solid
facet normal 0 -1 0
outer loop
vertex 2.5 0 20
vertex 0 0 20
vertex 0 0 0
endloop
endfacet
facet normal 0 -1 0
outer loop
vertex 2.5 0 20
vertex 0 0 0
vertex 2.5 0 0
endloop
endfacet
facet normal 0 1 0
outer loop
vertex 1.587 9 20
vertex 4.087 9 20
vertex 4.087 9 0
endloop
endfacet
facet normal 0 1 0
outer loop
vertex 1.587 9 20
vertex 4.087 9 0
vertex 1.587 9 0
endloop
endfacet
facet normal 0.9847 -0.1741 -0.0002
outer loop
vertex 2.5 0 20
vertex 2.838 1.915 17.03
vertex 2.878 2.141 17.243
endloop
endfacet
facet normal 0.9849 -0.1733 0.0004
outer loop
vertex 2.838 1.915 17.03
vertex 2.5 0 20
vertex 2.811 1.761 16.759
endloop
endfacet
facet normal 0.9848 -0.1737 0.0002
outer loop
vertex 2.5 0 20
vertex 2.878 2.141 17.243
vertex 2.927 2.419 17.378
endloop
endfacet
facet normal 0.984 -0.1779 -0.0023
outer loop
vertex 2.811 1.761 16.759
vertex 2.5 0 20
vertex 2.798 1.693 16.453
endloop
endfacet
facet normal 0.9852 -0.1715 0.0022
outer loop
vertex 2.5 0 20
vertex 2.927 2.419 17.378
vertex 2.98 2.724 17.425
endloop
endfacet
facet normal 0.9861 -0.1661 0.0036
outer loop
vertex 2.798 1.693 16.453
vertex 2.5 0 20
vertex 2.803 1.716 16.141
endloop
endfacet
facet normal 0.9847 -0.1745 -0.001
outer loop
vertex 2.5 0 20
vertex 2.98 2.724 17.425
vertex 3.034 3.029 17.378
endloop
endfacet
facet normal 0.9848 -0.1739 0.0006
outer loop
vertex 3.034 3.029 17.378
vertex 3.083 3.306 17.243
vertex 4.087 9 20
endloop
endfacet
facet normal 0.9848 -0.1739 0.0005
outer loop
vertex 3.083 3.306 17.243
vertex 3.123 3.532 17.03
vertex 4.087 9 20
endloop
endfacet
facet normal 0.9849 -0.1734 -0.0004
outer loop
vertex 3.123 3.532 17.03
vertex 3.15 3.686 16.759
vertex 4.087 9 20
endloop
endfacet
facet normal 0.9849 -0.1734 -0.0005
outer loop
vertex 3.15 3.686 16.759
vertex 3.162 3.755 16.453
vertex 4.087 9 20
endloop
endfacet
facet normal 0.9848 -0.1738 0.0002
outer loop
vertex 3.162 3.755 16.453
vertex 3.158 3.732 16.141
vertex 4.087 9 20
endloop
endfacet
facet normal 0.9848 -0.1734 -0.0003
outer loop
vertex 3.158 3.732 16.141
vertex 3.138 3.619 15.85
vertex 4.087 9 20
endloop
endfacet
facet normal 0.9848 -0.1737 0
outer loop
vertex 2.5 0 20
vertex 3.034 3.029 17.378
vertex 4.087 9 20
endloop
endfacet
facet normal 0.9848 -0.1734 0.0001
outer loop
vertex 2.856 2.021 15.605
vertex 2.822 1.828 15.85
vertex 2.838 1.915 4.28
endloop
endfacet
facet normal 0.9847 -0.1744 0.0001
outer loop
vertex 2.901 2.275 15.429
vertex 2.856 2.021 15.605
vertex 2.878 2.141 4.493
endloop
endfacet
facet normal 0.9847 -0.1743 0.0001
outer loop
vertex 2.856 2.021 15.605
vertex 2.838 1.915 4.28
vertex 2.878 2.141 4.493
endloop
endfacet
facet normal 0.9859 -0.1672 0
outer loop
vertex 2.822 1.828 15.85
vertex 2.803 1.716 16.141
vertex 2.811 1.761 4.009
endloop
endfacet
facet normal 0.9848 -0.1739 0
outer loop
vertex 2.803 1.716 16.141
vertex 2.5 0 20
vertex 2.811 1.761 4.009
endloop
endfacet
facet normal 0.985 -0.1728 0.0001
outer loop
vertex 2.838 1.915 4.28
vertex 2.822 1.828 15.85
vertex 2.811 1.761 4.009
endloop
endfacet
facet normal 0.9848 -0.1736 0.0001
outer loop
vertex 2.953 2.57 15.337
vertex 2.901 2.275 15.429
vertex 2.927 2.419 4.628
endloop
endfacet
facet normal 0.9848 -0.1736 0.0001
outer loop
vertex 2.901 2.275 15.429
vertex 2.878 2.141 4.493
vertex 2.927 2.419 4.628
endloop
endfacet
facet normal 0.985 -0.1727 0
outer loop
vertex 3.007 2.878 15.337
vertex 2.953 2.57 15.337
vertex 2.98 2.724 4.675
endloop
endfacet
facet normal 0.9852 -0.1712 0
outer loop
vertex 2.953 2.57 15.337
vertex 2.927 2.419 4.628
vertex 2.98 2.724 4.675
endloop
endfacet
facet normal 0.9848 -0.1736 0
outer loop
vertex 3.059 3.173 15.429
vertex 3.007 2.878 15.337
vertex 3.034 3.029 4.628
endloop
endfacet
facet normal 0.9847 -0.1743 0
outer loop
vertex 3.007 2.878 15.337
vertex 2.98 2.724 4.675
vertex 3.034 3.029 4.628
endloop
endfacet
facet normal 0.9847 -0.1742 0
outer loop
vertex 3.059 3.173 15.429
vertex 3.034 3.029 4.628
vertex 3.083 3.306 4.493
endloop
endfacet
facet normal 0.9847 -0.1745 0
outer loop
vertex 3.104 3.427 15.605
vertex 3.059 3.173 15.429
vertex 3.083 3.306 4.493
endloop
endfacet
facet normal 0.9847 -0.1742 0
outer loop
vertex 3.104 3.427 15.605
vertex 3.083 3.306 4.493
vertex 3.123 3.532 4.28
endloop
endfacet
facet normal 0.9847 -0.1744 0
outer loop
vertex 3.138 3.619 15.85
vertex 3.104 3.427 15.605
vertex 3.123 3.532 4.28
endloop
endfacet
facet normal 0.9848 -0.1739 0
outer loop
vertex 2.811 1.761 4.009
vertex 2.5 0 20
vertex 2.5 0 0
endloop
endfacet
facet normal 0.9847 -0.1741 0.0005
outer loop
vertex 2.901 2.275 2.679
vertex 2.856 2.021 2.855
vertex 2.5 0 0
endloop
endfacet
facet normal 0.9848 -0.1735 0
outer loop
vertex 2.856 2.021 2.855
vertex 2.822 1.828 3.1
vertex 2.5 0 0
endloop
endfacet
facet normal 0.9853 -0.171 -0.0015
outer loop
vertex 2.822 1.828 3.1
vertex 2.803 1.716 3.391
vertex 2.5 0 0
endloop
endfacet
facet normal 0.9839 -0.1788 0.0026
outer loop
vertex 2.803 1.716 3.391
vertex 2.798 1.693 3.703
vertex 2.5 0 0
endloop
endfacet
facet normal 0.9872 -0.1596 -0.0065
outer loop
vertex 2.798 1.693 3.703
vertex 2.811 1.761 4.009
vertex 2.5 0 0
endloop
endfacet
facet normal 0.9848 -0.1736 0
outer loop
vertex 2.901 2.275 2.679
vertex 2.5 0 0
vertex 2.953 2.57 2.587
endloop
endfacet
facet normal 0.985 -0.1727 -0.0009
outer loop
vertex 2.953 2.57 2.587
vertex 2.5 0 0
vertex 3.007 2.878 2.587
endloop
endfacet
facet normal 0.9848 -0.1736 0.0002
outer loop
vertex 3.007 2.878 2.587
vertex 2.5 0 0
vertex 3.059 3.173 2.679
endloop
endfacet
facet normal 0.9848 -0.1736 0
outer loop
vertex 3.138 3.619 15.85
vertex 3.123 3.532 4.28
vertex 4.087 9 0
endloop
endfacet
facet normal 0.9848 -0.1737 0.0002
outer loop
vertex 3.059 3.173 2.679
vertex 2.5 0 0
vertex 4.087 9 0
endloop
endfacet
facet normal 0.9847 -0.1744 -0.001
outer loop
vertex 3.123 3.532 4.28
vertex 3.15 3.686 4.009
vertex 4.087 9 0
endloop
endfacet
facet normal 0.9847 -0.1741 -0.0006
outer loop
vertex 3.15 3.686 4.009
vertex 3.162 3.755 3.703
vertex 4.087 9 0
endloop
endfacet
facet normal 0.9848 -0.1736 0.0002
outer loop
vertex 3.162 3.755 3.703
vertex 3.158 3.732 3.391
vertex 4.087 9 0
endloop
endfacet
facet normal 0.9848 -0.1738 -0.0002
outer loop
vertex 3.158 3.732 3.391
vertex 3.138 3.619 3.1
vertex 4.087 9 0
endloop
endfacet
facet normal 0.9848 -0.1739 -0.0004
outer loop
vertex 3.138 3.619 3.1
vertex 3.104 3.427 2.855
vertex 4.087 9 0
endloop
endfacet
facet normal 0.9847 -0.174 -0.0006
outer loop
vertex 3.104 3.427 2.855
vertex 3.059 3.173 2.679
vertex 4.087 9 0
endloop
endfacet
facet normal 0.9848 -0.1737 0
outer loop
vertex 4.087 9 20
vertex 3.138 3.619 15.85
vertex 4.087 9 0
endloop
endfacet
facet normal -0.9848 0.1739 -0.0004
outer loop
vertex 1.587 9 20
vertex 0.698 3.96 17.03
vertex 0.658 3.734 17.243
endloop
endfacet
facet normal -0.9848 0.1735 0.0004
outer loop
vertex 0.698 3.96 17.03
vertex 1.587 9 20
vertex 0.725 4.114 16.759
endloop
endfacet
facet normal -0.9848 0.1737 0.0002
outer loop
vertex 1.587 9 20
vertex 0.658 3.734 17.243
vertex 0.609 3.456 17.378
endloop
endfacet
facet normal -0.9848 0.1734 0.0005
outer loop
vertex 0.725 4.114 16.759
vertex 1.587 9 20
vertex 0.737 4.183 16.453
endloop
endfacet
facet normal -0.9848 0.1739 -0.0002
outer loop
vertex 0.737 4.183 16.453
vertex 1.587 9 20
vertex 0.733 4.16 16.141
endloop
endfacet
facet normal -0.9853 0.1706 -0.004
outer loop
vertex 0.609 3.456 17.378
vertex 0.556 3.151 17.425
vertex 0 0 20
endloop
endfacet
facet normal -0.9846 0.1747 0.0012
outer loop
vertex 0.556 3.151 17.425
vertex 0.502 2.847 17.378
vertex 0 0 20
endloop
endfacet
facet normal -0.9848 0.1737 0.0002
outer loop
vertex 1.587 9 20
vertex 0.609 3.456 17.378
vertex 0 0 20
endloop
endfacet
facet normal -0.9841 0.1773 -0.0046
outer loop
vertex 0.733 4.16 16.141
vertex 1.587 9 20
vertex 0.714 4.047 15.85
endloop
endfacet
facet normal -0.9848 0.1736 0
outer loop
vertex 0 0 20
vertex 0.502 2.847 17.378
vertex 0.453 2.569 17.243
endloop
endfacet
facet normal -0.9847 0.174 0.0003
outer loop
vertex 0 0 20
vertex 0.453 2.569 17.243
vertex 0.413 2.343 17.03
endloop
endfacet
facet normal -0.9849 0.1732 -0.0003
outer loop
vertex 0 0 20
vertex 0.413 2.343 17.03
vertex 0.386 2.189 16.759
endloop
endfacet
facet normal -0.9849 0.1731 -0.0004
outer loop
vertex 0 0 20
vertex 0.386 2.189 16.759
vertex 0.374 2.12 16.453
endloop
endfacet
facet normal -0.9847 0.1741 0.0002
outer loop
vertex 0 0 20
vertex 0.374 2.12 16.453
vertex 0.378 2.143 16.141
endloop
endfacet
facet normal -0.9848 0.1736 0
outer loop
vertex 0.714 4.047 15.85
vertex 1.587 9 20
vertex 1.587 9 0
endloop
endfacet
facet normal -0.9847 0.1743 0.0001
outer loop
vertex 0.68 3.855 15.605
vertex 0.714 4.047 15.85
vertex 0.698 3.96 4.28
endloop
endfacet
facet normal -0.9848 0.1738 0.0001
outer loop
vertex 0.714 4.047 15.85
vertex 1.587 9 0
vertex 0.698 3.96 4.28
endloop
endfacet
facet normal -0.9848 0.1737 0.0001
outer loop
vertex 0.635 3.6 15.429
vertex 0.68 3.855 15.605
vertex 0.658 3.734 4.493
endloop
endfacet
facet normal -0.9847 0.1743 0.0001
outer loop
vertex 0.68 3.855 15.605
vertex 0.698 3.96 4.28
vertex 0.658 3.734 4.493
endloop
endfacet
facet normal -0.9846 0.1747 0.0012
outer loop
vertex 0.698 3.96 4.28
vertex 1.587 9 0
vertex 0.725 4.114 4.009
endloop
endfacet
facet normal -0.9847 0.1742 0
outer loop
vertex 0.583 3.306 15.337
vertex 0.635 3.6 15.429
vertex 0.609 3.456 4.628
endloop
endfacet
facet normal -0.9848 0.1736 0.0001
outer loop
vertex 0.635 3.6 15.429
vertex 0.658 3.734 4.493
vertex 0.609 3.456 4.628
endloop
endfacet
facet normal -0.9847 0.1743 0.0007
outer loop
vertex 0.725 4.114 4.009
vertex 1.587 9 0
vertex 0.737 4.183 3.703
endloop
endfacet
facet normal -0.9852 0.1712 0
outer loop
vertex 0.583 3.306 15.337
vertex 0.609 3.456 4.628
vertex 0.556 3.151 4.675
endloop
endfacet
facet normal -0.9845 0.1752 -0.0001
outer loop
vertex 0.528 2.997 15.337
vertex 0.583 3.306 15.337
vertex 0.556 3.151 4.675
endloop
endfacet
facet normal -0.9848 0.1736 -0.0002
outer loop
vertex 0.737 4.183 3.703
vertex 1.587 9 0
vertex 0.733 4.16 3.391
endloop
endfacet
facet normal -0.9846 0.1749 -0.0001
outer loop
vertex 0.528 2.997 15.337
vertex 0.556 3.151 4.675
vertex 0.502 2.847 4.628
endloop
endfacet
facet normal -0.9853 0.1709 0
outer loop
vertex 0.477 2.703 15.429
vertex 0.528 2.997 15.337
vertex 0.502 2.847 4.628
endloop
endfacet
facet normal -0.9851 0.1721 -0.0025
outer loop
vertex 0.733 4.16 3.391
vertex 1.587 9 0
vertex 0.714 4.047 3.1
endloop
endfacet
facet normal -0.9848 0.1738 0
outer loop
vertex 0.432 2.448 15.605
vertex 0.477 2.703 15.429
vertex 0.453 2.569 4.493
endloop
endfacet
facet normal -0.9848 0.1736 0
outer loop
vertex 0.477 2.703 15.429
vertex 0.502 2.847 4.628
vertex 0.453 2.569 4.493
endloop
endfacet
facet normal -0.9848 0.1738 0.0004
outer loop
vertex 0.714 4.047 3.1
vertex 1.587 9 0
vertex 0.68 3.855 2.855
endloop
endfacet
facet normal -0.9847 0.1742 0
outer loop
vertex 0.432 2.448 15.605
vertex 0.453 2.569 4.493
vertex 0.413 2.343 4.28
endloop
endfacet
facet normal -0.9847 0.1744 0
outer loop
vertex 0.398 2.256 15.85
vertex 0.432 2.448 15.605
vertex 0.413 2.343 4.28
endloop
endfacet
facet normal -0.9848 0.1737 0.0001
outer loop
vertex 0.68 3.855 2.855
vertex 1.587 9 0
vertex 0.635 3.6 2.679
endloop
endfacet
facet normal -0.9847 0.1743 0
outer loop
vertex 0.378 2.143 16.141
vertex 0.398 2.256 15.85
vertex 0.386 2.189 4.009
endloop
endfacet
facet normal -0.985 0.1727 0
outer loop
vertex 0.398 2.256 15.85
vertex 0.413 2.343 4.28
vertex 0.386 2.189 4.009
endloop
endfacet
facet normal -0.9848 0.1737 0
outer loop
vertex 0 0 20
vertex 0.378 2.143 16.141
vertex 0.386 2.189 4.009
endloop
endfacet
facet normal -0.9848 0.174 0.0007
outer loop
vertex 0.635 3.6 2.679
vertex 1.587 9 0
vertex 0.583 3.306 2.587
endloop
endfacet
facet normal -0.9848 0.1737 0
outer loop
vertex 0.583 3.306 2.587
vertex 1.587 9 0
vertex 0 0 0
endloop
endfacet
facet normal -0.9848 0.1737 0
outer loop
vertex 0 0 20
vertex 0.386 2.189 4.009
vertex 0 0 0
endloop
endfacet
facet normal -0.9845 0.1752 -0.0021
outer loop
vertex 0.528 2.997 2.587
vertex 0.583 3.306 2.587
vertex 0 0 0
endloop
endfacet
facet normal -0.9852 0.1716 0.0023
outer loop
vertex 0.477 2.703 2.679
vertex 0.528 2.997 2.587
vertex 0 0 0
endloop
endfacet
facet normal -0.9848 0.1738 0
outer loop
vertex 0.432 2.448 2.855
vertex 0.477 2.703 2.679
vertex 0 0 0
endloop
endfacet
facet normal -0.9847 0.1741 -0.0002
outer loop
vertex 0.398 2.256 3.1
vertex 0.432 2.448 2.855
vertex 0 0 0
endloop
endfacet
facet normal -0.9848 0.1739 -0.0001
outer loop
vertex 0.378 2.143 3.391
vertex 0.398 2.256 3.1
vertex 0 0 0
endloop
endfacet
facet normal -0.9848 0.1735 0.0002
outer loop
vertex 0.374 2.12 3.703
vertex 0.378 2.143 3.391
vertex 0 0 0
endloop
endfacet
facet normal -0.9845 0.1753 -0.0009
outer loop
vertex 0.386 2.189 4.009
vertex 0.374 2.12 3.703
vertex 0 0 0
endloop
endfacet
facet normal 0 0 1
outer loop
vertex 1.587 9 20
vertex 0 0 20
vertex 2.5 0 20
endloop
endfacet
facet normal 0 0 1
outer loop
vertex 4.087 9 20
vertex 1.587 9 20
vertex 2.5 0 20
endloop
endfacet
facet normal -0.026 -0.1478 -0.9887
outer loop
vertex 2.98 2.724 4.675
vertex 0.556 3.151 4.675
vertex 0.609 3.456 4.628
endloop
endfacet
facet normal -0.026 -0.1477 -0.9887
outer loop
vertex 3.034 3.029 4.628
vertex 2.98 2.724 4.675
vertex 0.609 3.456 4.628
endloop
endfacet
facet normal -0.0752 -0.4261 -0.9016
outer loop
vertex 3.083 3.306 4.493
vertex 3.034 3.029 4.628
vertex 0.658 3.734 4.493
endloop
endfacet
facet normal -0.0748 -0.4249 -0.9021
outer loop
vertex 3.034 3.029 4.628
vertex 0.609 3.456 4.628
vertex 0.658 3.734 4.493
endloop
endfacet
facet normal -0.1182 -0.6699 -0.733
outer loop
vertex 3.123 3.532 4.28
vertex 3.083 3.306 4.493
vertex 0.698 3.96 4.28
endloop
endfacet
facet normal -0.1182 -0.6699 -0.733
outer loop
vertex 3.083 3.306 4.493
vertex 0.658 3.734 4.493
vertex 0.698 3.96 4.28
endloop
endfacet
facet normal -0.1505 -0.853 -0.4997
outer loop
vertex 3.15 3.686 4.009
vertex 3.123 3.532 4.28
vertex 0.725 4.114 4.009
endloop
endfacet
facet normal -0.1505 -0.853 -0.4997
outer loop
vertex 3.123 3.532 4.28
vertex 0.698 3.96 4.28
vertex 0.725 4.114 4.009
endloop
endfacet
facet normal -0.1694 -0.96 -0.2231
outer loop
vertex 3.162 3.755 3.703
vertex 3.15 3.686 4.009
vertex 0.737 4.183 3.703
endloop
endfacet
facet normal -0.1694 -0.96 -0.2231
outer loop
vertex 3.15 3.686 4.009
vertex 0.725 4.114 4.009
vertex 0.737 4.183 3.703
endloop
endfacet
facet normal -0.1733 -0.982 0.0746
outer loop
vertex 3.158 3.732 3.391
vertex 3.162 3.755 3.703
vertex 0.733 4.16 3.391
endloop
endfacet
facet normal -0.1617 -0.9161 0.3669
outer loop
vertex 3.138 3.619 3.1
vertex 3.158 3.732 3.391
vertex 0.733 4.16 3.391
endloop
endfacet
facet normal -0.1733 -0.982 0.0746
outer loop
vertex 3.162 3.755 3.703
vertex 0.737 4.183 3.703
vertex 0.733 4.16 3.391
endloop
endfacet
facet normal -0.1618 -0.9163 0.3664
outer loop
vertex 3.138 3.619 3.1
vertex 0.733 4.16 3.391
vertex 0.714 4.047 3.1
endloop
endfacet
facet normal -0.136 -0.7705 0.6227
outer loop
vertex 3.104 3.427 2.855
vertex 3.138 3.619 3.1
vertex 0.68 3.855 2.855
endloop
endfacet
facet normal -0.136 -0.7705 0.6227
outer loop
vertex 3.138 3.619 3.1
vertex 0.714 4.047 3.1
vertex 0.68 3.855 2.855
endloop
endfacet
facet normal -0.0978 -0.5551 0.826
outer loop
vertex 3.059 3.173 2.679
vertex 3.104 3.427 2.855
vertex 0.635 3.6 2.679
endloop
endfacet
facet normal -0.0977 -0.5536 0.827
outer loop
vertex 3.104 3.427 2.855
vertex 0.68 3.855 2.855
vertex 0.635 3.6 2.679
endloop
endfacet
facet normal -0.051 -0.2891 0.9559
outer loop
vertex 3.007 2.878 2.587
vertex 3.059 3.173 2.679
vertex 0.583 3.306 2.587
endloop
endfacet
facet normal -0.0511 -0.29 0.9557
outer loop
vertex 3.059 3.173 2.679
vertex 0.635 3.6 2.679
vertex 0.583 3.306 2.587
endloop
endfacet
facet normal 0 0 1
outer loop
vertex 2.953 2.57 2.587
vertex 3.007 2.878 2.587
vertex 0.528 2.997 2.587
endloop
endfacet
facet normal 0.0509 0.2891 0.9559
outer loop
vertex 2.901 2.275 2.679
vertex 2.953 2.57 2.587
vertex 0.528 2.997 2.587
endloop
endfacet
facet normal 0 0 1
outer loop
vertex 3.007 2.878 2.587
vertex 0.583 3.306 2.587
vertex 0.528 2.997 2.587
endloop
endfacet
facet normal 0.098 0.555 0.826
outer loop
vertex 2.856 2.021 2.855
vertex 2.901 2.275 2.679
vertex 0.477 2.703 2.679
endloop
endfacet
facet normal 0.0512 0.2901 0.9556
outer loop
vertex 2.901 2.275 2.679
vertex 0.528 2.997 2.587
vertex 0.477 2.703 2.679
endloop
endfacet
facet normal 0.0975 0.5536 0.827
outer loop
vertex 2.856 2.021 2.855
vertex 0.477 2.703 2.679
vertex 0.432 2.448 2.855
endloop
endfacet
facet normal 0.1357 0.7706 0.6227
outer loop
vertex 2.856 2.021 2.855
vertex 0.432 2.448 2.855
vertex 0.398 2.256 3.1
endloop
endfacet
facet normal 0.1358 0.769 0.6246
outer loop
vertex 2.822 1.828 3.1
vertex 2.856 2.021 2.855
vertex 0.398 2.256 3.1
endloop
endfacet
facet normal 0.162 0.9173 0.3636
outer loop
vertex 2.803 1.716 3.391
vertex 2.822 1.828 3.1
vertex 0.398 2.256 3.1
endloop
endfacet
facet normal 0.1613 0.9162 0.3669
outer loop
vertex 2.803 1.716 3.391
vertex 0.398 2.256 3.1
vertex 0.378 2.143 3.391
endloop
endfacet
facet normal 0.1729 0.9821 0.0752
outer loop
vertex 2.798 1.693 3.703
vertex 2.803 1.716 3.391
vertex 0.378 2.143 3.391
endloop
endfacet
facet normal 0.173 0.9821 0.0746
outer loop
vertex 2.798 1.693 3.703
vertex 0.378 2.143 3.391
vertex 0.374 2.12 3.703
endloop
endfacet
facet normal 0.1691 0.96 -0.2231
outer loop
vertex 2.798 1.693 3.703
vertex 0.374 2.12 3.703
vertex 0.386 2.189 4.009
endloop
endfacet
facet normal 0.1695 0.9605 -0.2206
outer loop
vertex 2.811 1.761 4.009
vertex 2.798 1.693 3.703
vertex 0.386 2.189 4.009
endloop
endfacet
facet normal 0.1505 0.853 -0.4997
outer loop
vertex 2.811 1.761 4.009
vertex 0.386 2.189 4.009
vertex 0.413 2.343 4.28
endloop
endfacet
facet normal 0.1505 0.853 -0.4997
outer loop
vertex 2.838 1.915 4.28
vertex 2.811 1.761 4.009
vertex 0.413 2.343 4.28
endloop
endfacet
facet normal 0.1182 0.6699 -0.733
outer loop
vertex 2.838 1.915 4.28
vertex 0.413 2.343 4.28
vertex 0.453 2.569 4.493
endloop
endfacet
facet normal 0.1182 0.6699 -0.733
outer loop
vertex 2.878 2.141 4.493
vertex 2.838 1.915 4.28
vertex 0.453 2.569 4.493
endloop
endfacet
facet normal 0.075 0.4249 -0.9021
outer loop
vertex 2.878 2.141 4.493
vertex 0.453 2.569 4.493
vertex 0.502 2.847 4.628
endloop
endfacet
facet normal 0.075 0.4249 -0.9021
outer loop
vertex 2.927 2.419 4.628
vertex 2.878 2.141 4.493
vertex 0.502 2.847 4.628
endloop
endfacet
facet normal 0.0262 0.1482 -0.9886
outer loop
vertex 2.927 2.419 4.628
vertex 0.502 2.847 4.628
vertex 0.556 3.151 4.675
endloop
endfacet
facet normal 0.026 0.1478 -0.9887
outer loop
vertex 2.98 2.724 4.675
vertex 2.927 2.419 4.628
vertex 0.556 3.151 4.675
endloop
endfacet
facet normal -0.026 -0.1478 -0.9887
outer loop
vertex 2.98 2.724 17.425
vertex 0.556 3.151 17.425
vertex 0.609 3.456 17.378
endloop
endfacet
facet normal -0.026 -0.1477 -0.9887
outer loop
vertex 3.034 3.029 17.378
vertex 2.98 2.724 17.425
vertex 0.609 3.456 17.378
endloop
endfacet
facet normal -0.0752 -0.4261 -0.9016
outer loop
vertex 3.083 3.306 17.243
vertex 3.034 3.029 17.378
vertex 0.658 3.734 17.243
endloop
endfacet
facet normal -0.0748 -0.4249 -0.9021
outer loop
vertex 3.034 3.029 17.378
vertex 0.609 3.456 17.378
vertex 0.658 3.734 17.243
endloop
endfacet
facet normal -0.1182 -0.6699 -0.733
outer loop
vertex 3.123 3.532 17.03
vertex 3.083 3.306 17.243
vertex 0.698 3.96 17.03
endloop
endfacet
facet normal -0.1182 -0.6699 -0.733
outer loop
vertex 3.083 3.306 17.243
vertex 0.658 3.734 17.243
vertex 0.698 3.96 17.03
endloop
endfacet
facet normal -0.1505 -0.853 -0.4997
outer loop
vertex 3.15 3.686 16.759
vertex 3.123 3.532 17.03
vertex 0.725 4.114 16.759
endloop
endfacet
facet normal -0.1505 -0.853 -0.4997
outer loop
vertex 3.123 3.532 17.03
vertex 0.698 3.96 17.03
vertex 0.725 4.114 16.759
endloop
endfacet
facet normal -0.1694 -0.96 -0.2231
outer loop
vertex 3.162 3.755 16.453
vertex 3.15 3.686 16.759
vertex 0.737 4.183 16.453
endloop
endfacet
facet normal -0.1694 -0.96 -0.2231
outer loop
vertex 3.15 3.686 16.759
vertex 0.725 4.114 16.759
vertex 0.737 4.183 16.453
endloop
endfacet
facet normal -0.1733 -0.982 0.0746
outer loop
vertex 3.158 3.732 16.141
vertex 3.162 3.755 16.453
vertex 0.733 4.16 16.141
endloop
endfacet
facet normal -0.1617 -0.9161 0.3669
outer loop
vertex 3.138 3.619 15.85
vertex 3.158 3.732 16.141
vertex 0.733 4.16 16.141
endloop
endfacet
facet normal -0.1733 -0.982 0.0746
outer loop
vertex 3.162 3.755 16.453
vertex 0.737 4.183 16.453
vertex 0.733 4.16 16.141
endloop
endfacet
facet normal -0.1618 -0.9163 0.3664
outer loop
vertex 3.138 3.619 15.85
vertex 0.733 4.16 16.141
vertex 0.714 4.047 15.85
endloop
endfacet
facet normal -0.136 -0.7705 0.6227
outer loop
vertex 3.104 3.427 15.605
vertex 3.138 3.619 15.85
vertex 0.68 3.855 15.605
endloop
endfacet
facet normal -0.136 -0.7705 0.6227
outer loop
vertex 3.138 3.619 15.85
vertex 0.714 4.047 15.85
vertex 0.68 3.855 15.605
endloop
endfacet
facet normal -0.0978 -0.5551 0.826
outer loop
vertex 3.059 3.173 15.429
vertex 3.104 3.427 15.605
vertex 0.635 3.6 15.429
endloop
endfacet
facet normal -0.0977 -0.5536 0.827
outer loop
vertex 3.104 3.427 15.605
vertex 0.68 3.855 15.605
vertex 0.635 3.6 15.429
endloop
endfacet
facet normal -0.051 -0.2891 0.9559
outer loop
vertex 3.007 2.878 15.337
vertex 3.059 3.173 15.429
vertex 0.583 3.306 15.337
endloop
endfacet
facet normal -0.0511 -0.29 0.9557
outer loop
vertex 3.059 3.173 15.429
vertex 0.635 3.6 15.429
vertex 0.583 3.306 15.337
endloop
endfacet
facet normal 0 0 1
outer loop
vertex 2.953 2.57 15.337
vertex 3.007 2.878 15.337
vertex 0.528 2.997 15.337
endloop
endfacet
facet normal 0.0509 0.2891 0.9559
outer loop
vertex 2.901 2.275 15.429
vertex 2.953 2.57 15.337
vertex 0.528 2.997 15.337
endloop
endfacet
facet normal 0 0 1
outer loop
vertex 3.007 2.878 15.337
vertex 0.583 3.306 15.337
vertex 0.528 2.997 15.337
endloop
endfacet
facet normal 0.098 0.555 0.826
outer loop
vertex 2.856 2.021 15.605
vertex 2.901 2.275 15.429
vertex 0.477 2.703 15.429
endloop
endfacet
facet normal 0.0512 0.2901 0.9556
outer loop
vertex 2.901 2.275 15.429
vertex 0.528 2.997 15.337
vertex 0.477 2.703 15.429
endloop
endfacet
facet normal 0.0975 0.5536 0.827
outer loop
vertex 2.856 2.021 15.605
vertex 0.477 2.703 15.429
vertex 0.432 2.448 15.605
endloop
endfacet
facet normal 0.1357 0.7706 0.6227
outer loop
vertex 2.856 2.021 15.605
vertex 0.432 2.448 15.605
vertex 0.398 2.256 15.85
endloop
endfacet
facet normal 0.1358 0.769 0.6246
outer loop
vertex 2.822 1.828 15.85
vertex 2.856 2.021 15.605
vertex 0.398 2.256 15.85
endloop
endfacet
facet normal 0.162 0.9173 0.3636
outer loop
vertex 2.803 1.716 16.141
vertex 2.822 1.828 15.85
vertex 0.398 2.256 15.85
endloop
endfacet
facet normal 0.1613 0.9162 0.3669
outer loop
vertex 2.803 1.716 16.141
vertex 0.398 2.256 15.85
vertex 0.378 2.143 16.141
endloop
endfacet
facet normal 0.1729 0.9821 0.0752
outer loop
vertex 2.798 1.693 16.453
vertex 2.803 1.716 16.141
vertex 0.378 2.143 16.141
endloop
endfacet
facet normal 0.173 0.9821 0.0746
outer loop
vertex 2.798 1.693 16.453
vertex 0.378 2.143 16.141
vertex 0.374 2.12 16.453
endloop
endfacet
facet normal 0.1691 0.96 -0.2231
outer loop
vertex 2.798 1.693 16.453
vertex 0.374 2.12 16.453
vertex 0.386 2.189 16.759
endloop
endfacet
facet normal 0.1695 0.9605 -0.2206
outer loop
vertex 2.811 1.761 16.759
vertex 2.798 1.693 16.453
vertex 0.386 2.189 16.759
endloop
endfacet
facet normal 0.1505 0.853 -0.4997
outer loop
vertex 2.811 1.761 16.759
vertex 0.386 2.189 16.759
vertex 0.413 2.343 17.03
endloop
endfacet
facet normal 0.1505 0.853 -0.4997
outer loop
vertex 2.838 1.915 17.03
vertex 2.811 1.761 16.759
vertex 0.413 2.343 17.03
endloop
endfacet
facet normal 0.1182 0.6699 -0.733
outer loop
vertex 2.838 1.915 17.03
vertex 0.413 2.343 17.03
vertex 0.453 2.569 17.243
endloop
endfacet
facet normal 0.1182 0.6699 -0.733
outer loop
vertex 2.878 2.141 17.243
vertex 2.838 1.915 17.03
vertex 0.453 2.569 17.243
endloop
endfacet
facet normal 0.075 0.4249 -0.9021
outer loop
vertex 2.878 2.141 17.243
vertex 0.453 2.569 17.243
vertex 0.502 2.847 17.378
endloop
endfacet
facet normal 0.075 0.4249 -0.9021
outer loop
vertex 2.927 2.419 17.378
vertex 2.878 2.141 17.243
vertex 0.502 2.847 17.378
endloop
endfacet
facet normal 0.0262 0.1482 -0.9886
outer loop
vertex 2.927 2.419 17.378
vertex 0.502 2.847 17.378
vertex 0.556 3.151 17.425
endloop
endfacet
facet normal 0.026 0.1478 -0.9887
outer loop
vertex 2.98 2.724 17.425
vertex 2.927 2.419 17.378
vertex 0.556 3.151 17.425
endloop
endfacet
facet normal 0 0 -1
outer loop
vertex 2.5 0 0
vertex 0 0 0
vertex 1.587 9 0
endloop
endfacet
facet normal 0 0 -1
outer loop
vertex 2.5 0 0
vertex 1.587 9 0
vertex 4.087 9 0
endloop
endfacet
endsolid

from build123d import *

# Parameters (mm, degrees)
BOSS_EXTRUDE2_DEPTH = 20
SKETCH4_R           = 1.05
CUT_EXTRUDE1_DEPTH  = 5.024852982


with BuildPart() as part:
    # Sketch2 → Boss-Extrude2 (new body)
    with BuildSketch(Plane.XY):
        Polygon((0, 0), (2.5, 0), (4.086942826, 9), (1.586942826, 9), align=None)
    extrude(amount=BOSS_EXTRUDE2_DEPTH)

    # Sketch4 → Cut-Extrude1 (cut, through all)
    with BuildSketch(Plane(origin=(0, 0, 0), x_dir=(0, 0, 1), z_dir=(-0.984807753, 0.173648178, 0))):
        with Locations((3.625, 3.2)):
            Circle(SKETCH4_R)
        with Locations((16.375, 3.2)):
            Circle(SKETCH4_R)
    extrude(amount=-CUT_EXTRUDE1_DEPTH, mode=Mode.SUBTRACT)


solid = part.part
